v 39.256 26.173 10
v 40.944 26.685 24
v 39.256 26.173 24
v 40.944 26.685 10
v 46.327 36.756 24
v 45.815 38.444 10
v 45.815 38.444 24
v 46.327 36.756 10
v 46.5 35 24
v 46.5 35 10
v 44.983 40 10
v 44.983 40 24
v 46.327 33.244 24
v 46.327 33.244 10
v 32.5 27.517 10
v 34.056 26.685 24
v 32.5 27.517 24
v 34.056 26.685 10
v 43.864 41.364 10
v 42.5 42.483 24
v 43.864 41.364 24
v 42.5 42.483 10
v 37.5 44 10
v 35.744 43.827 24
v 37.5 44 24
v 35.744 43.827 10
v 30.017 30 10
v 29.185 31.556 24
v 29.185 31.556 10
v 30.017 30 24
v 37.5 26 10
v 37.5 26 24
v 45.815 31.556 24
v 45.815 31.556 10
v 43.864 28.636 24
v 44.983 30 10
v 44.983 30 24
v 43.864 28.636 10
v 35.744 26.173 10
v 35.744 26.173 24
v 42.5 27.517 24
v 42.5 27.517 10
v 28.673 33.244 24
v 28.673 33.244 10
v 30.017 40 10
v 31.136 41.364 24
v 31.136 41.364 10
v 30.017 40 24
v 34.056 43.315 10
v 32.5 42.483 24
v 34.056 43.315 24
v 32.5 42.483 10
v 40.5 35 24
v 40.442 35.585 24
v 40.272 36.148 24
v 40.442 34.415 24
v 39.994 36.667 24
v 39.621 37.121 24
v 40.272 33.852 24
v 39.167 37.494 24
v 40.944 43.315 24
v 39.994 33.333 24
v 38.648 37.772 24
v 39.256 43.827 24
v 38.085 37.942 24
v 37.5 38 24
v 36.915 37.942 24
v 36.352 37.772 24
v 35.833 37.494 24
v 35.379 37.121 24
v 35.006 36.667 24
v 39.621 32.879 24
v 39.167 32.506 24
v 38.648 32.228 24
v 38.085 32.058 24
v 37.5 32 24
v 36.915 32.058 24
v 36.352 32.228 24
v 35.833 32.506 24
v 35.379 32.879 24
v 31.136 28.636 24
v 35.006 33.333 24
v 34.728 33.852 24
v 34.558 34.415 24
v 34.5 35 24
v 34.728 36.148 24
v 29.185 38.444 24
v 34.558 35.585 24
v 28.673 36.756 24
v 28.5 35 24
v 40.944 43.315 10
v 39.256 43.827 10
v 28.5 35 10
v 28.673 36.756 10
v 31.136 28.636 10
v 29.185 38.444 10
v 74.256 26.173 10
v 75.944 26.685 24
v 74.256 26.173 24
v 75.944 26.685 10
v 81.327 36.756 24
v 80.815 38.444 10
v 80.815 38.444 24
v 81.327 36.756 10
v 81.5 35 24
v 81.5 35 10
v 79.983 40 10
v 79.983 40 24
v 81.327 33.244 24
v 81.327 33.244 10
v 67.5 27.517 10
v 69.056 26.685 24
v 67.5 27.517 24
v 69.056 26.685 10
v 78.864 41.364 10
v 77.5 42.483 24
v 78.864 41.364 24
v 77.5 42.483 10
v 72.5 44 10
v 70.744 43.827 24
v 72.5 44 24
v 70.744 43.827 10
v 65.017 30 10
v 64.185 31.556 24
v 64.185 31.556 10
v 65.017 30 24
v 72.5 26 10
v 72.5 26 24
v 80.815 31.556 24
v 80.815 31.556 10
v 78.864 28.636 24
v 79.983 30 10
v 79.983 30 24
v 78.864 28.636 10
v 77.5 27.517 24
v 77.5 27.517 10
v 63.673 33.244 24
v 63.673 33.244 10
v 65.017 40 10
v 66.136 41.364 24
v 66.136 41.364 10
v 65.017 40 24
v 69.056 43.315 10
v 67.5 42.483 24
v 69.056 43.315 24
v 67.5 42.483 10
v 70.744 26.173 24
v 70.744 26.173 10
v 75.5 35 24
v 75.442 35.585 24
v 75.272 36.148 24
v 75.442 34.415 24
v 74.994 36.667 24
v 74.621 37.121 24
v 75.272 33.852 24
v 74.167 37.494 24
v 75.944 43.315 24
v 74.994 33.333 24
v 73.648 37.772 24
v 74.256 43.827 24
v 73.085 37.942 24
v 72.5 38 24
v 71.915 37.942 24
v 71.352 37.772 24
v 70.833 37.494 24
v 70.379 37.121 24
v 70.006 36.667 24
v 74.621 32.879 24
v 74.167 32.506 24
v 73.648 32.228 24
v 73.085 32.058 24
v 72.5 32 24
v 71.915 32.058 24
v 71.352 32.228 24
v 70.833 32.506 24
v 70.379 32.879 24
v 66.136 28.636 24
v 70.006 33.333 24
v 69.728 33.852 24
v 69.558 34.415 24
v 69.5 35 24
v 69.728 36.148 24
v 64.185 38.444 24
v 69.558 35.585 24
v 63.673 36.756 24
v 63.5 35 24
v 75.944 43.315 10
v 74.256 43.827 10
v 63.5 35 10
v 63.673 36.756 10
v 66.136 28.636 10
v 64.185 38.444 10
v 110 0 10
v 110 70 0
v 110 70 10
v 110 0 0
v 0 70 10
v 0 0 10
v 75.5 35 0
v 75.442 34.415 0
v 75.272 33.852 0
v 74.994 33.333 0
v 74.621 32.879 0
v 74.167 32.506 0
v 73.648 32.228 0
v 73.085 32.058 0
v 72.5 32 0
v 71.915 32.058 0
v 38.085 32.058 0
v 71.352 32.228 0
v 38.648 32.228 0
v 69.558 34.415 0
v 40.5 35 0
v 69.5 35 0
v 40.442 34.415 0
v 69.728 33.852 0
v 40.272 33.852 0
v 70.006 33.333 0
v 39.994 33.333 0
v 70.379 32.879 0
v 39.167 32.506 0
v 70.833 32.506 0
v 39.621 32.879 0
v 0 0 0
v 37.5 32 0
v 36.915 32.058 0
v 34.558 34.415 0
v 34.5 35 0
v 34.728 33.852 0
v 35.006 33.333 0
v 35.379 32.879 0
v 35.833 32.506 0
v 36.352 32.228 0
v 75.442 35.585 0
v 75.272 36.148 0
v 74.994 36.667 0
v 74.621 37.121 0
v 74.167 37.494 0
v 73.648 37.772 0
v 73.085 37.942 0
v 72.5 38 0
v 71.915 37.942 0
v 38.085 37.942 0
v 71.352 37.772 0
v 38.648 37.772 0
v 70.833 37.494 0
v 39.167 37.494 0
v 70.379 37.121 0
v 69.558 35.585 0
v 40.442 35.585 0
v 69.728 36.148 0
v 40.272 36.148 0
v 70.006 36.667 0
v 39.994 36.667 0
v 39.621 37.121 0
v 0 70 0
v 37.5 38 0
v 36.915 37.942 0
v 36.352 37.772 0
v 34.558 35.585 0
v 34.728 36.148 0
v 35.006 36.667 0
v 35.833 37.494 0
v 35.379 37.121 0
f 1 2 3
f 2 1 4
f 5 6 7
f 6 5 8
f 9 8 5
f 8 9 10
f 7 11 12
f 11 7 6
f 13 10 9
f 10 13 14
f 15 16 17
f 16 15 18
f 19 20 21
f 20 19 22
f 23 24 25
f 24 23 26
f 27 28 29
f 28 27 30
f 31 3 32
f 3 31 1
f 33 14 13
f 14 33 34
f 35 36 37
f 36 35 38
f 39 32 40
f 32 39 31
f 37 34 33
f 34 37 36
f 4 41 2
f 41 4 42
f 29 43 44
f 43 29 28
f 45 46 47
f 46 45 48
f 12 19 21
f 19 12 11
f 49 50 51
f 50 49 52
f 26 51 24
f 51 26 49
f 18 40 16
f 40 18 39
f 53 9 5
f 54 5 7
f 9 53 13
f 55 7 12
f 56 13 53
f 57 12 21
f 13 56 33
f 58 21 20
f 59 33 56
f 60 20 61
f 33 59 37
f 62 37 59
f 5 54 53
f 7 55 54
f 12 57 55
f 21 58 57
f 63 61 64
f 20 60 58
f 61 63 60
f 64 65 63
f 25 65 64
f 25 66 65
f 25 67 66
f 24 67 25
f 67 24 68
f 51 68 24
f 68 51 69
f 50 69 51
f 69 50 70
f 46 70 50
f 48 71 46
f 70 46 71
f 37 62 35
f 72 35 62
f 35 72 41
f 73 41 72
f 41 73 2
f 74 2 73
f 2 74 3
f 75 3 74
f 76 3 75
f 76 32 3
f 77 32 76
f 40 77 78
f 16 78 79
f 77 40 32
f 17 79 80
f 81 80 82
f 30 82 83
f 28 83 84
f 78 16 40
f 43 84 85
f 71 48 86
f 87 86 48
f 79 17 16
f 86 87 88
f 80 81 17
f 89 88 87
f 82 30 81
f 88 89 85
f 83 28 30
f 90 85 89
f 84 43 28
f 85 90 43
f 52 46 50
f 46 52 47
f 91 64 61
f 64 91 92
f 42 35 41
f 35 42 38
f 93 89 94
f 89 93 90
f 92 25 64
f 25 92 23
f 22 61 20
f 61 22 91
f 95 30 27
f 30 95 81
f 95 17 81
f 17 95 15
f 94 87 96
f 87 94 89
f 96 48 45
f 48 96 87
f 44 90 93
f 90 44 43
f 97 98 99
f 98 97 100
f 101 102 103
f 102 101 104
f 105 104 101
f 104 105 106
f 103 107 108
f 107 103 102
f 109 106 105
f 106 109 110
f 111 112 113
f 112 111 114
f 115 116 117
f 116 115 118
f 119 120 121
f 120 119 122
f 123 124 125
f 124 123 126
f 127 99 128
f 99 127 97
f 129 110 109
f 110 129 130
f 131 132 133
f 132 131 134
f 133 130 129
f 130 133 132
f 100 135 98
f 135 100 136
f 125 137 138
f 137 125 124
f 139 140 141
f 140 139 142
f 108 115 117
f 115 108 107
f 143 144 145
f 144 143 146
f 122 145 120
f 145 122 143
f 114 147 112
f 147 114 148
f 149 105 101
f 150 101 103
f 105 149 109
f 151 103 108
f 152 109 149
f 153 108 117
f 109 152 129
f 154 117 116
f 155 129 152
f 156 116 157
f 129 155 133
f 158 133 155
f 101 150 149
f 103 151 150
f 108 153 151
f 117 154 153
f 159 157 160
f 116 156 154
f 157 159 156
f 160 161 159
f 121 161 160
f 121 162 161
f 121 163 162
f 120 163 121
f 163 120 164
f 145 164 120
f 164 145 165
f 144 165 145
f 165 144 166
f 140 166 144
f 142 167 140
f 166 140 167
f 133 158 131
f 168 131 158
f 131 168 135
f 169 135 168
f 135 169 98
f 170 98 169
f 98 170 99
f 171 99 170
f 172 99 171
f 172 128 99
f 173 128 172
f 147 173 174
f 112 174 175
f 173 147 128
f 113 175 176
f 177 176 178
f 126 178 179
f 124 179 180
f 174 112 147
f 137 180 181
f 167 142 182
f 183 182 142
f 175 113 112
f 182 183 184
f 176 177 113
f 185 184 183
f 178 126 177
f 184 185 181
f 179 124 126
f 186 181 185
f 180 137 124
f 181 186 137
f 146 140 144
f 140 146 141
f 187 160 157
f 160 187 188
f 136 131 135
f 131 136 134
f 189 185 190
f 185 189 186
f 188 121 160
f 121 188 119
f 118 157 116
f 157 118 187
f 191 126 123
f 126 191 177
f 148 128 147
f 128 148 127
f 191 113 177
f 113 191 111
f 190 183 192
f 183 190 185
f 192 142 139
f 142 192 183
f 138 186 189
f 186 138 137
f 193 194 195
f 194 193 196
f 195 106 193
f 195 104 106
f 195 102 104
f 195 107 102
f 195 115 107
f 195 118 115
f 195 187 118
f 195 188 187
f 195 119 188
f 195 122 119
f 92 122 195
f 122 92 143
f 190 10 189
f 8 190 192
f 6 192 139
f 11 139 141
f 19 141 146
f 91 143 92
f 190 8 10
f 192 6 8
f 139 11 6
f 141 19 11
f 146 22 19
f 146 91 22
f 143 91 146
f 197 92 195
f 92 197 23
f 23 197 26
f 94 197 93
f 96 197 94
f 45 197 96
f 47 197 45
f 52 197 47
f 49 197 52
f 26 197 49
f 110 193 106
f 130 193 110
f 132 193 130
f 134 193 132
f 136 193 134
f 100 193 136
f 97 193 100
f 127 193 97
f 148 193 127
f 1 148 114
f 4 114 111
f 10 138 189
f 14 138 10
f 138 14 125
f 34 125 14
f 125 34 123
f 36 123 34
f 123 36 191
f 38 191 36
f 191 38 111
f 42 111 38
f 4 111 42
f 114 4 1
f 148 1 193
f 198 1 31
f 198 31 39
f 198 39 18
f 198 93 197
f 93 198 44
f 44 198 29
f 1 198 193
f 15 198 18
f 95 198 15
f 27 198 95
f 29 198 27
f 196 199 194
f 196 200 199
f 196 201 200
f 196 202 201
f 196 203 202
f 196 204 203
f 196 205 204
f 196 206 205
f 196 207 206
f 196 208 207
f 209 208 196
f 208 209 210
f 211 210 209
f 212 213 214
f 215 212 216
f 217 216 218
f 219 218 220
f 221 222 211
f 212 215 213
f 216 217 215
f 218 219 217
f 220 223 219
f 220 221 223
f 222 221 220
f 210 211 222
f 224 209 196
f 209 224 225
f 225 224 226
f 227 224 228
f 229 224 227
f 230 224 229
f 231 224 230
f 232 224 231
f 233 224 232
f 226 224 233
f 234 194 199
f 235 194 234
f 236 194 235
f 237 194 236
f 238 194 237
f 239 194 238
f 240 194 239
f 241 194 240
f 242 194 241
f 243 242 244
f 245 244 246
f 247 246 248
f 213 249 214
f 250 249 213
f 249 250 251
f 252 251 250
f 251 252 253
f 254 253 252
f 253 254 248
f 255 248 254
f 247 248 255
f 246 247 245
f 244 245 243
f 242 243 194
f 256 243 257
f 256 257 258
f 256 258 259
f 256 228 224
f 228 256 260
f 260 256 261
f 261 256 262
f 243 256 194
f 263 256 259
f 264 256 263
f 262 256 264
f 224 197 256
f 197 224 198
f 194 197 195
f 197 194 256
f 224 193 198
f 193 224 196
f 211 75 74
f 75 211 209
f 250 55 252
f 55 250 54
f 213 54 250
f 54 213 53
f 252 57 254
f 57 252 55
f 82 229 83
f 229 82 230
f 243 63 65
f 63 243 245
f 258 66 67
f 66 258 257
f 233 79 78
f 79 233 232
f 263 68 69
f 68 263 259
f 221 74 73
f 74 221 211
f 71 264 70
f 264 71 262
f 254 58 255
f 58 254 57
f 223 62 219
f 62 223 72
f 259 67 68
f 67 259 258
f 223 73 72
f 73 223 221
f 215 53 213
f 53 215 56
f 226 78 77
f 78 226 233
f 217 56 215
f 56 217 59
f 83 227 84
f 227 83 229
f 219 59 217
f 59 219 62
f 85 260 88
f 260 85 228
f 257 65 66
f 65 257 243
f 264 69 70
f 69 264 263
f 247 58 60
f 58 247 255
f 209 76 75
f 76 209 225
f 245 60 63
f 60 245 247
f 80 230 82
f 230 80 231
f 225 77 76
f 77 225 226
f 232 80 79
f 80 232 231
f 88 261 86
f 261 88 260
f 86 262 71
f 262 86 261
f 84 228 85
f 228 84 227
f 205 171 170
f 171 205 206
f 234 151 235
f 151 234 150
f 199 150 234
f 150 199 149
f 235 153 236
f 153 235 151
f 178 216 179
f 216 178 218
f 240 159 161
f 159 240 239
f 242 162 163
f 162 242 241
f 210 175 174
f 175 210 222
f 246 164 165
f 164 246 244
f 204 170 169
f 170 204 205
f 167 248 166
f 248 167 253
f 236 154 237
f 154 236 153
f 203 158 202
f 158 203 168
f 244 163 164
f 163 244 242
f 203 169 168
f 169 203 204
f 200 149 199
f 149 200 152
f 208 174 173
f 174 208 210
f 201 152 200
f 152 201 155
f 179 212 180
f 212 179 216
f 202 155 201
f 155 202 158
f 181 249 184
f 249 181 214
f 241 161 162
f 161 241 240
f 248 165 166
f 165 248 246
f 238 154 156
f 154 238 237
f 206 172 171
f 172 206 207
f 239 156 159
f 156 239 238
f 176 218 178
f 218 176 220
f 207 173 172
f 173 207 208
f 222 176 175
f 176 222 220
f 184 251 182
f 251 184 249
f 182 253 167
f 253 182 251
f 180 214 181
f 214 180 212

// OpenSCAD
$fn = 32;

// ----------------------------------------------------------------------
// Drill jig: two_boss jig
// ----------------------------------------------------------------------

// --- parameters (mm) ---
plate_l = 110;            // plate length, X
plate_w = 70;             // plate width, Y
plate_t = 10;             // plate thickness
boss_d = 18;              // guide boss diameter
boss_h = 15;              // boss height above the plate
guide_d = 6;              // guide hole diameter
boss_pitch = 35;          // boss pitch

n_boss = 2;  // guide bosses
boss_x0 = (plate_l - (n_boss - 1) * boss_pitch) / 2;  // first boss X
boss_top = plate_t - 1 + boss_h;  // boss crown height
total_h = boss_top;  // overall height

difference() {
  union() {
  cube([plate_l, plate_w, plate_t]);
  for (i = [0 : n_boss - 1])
    translate([boss_x0 + i * boss_pitch, plate_w / 2, plate_t - 1])
      cylinder(h = boss_h, d = boss_d);
  }
  for (i = [0 : n_boss - 1])
    translate([boss_x0 + i * boss_pitch, plate_w / 2, -1])
      cylinder(h = plate_t + boss_h, d = guide_d);
}
